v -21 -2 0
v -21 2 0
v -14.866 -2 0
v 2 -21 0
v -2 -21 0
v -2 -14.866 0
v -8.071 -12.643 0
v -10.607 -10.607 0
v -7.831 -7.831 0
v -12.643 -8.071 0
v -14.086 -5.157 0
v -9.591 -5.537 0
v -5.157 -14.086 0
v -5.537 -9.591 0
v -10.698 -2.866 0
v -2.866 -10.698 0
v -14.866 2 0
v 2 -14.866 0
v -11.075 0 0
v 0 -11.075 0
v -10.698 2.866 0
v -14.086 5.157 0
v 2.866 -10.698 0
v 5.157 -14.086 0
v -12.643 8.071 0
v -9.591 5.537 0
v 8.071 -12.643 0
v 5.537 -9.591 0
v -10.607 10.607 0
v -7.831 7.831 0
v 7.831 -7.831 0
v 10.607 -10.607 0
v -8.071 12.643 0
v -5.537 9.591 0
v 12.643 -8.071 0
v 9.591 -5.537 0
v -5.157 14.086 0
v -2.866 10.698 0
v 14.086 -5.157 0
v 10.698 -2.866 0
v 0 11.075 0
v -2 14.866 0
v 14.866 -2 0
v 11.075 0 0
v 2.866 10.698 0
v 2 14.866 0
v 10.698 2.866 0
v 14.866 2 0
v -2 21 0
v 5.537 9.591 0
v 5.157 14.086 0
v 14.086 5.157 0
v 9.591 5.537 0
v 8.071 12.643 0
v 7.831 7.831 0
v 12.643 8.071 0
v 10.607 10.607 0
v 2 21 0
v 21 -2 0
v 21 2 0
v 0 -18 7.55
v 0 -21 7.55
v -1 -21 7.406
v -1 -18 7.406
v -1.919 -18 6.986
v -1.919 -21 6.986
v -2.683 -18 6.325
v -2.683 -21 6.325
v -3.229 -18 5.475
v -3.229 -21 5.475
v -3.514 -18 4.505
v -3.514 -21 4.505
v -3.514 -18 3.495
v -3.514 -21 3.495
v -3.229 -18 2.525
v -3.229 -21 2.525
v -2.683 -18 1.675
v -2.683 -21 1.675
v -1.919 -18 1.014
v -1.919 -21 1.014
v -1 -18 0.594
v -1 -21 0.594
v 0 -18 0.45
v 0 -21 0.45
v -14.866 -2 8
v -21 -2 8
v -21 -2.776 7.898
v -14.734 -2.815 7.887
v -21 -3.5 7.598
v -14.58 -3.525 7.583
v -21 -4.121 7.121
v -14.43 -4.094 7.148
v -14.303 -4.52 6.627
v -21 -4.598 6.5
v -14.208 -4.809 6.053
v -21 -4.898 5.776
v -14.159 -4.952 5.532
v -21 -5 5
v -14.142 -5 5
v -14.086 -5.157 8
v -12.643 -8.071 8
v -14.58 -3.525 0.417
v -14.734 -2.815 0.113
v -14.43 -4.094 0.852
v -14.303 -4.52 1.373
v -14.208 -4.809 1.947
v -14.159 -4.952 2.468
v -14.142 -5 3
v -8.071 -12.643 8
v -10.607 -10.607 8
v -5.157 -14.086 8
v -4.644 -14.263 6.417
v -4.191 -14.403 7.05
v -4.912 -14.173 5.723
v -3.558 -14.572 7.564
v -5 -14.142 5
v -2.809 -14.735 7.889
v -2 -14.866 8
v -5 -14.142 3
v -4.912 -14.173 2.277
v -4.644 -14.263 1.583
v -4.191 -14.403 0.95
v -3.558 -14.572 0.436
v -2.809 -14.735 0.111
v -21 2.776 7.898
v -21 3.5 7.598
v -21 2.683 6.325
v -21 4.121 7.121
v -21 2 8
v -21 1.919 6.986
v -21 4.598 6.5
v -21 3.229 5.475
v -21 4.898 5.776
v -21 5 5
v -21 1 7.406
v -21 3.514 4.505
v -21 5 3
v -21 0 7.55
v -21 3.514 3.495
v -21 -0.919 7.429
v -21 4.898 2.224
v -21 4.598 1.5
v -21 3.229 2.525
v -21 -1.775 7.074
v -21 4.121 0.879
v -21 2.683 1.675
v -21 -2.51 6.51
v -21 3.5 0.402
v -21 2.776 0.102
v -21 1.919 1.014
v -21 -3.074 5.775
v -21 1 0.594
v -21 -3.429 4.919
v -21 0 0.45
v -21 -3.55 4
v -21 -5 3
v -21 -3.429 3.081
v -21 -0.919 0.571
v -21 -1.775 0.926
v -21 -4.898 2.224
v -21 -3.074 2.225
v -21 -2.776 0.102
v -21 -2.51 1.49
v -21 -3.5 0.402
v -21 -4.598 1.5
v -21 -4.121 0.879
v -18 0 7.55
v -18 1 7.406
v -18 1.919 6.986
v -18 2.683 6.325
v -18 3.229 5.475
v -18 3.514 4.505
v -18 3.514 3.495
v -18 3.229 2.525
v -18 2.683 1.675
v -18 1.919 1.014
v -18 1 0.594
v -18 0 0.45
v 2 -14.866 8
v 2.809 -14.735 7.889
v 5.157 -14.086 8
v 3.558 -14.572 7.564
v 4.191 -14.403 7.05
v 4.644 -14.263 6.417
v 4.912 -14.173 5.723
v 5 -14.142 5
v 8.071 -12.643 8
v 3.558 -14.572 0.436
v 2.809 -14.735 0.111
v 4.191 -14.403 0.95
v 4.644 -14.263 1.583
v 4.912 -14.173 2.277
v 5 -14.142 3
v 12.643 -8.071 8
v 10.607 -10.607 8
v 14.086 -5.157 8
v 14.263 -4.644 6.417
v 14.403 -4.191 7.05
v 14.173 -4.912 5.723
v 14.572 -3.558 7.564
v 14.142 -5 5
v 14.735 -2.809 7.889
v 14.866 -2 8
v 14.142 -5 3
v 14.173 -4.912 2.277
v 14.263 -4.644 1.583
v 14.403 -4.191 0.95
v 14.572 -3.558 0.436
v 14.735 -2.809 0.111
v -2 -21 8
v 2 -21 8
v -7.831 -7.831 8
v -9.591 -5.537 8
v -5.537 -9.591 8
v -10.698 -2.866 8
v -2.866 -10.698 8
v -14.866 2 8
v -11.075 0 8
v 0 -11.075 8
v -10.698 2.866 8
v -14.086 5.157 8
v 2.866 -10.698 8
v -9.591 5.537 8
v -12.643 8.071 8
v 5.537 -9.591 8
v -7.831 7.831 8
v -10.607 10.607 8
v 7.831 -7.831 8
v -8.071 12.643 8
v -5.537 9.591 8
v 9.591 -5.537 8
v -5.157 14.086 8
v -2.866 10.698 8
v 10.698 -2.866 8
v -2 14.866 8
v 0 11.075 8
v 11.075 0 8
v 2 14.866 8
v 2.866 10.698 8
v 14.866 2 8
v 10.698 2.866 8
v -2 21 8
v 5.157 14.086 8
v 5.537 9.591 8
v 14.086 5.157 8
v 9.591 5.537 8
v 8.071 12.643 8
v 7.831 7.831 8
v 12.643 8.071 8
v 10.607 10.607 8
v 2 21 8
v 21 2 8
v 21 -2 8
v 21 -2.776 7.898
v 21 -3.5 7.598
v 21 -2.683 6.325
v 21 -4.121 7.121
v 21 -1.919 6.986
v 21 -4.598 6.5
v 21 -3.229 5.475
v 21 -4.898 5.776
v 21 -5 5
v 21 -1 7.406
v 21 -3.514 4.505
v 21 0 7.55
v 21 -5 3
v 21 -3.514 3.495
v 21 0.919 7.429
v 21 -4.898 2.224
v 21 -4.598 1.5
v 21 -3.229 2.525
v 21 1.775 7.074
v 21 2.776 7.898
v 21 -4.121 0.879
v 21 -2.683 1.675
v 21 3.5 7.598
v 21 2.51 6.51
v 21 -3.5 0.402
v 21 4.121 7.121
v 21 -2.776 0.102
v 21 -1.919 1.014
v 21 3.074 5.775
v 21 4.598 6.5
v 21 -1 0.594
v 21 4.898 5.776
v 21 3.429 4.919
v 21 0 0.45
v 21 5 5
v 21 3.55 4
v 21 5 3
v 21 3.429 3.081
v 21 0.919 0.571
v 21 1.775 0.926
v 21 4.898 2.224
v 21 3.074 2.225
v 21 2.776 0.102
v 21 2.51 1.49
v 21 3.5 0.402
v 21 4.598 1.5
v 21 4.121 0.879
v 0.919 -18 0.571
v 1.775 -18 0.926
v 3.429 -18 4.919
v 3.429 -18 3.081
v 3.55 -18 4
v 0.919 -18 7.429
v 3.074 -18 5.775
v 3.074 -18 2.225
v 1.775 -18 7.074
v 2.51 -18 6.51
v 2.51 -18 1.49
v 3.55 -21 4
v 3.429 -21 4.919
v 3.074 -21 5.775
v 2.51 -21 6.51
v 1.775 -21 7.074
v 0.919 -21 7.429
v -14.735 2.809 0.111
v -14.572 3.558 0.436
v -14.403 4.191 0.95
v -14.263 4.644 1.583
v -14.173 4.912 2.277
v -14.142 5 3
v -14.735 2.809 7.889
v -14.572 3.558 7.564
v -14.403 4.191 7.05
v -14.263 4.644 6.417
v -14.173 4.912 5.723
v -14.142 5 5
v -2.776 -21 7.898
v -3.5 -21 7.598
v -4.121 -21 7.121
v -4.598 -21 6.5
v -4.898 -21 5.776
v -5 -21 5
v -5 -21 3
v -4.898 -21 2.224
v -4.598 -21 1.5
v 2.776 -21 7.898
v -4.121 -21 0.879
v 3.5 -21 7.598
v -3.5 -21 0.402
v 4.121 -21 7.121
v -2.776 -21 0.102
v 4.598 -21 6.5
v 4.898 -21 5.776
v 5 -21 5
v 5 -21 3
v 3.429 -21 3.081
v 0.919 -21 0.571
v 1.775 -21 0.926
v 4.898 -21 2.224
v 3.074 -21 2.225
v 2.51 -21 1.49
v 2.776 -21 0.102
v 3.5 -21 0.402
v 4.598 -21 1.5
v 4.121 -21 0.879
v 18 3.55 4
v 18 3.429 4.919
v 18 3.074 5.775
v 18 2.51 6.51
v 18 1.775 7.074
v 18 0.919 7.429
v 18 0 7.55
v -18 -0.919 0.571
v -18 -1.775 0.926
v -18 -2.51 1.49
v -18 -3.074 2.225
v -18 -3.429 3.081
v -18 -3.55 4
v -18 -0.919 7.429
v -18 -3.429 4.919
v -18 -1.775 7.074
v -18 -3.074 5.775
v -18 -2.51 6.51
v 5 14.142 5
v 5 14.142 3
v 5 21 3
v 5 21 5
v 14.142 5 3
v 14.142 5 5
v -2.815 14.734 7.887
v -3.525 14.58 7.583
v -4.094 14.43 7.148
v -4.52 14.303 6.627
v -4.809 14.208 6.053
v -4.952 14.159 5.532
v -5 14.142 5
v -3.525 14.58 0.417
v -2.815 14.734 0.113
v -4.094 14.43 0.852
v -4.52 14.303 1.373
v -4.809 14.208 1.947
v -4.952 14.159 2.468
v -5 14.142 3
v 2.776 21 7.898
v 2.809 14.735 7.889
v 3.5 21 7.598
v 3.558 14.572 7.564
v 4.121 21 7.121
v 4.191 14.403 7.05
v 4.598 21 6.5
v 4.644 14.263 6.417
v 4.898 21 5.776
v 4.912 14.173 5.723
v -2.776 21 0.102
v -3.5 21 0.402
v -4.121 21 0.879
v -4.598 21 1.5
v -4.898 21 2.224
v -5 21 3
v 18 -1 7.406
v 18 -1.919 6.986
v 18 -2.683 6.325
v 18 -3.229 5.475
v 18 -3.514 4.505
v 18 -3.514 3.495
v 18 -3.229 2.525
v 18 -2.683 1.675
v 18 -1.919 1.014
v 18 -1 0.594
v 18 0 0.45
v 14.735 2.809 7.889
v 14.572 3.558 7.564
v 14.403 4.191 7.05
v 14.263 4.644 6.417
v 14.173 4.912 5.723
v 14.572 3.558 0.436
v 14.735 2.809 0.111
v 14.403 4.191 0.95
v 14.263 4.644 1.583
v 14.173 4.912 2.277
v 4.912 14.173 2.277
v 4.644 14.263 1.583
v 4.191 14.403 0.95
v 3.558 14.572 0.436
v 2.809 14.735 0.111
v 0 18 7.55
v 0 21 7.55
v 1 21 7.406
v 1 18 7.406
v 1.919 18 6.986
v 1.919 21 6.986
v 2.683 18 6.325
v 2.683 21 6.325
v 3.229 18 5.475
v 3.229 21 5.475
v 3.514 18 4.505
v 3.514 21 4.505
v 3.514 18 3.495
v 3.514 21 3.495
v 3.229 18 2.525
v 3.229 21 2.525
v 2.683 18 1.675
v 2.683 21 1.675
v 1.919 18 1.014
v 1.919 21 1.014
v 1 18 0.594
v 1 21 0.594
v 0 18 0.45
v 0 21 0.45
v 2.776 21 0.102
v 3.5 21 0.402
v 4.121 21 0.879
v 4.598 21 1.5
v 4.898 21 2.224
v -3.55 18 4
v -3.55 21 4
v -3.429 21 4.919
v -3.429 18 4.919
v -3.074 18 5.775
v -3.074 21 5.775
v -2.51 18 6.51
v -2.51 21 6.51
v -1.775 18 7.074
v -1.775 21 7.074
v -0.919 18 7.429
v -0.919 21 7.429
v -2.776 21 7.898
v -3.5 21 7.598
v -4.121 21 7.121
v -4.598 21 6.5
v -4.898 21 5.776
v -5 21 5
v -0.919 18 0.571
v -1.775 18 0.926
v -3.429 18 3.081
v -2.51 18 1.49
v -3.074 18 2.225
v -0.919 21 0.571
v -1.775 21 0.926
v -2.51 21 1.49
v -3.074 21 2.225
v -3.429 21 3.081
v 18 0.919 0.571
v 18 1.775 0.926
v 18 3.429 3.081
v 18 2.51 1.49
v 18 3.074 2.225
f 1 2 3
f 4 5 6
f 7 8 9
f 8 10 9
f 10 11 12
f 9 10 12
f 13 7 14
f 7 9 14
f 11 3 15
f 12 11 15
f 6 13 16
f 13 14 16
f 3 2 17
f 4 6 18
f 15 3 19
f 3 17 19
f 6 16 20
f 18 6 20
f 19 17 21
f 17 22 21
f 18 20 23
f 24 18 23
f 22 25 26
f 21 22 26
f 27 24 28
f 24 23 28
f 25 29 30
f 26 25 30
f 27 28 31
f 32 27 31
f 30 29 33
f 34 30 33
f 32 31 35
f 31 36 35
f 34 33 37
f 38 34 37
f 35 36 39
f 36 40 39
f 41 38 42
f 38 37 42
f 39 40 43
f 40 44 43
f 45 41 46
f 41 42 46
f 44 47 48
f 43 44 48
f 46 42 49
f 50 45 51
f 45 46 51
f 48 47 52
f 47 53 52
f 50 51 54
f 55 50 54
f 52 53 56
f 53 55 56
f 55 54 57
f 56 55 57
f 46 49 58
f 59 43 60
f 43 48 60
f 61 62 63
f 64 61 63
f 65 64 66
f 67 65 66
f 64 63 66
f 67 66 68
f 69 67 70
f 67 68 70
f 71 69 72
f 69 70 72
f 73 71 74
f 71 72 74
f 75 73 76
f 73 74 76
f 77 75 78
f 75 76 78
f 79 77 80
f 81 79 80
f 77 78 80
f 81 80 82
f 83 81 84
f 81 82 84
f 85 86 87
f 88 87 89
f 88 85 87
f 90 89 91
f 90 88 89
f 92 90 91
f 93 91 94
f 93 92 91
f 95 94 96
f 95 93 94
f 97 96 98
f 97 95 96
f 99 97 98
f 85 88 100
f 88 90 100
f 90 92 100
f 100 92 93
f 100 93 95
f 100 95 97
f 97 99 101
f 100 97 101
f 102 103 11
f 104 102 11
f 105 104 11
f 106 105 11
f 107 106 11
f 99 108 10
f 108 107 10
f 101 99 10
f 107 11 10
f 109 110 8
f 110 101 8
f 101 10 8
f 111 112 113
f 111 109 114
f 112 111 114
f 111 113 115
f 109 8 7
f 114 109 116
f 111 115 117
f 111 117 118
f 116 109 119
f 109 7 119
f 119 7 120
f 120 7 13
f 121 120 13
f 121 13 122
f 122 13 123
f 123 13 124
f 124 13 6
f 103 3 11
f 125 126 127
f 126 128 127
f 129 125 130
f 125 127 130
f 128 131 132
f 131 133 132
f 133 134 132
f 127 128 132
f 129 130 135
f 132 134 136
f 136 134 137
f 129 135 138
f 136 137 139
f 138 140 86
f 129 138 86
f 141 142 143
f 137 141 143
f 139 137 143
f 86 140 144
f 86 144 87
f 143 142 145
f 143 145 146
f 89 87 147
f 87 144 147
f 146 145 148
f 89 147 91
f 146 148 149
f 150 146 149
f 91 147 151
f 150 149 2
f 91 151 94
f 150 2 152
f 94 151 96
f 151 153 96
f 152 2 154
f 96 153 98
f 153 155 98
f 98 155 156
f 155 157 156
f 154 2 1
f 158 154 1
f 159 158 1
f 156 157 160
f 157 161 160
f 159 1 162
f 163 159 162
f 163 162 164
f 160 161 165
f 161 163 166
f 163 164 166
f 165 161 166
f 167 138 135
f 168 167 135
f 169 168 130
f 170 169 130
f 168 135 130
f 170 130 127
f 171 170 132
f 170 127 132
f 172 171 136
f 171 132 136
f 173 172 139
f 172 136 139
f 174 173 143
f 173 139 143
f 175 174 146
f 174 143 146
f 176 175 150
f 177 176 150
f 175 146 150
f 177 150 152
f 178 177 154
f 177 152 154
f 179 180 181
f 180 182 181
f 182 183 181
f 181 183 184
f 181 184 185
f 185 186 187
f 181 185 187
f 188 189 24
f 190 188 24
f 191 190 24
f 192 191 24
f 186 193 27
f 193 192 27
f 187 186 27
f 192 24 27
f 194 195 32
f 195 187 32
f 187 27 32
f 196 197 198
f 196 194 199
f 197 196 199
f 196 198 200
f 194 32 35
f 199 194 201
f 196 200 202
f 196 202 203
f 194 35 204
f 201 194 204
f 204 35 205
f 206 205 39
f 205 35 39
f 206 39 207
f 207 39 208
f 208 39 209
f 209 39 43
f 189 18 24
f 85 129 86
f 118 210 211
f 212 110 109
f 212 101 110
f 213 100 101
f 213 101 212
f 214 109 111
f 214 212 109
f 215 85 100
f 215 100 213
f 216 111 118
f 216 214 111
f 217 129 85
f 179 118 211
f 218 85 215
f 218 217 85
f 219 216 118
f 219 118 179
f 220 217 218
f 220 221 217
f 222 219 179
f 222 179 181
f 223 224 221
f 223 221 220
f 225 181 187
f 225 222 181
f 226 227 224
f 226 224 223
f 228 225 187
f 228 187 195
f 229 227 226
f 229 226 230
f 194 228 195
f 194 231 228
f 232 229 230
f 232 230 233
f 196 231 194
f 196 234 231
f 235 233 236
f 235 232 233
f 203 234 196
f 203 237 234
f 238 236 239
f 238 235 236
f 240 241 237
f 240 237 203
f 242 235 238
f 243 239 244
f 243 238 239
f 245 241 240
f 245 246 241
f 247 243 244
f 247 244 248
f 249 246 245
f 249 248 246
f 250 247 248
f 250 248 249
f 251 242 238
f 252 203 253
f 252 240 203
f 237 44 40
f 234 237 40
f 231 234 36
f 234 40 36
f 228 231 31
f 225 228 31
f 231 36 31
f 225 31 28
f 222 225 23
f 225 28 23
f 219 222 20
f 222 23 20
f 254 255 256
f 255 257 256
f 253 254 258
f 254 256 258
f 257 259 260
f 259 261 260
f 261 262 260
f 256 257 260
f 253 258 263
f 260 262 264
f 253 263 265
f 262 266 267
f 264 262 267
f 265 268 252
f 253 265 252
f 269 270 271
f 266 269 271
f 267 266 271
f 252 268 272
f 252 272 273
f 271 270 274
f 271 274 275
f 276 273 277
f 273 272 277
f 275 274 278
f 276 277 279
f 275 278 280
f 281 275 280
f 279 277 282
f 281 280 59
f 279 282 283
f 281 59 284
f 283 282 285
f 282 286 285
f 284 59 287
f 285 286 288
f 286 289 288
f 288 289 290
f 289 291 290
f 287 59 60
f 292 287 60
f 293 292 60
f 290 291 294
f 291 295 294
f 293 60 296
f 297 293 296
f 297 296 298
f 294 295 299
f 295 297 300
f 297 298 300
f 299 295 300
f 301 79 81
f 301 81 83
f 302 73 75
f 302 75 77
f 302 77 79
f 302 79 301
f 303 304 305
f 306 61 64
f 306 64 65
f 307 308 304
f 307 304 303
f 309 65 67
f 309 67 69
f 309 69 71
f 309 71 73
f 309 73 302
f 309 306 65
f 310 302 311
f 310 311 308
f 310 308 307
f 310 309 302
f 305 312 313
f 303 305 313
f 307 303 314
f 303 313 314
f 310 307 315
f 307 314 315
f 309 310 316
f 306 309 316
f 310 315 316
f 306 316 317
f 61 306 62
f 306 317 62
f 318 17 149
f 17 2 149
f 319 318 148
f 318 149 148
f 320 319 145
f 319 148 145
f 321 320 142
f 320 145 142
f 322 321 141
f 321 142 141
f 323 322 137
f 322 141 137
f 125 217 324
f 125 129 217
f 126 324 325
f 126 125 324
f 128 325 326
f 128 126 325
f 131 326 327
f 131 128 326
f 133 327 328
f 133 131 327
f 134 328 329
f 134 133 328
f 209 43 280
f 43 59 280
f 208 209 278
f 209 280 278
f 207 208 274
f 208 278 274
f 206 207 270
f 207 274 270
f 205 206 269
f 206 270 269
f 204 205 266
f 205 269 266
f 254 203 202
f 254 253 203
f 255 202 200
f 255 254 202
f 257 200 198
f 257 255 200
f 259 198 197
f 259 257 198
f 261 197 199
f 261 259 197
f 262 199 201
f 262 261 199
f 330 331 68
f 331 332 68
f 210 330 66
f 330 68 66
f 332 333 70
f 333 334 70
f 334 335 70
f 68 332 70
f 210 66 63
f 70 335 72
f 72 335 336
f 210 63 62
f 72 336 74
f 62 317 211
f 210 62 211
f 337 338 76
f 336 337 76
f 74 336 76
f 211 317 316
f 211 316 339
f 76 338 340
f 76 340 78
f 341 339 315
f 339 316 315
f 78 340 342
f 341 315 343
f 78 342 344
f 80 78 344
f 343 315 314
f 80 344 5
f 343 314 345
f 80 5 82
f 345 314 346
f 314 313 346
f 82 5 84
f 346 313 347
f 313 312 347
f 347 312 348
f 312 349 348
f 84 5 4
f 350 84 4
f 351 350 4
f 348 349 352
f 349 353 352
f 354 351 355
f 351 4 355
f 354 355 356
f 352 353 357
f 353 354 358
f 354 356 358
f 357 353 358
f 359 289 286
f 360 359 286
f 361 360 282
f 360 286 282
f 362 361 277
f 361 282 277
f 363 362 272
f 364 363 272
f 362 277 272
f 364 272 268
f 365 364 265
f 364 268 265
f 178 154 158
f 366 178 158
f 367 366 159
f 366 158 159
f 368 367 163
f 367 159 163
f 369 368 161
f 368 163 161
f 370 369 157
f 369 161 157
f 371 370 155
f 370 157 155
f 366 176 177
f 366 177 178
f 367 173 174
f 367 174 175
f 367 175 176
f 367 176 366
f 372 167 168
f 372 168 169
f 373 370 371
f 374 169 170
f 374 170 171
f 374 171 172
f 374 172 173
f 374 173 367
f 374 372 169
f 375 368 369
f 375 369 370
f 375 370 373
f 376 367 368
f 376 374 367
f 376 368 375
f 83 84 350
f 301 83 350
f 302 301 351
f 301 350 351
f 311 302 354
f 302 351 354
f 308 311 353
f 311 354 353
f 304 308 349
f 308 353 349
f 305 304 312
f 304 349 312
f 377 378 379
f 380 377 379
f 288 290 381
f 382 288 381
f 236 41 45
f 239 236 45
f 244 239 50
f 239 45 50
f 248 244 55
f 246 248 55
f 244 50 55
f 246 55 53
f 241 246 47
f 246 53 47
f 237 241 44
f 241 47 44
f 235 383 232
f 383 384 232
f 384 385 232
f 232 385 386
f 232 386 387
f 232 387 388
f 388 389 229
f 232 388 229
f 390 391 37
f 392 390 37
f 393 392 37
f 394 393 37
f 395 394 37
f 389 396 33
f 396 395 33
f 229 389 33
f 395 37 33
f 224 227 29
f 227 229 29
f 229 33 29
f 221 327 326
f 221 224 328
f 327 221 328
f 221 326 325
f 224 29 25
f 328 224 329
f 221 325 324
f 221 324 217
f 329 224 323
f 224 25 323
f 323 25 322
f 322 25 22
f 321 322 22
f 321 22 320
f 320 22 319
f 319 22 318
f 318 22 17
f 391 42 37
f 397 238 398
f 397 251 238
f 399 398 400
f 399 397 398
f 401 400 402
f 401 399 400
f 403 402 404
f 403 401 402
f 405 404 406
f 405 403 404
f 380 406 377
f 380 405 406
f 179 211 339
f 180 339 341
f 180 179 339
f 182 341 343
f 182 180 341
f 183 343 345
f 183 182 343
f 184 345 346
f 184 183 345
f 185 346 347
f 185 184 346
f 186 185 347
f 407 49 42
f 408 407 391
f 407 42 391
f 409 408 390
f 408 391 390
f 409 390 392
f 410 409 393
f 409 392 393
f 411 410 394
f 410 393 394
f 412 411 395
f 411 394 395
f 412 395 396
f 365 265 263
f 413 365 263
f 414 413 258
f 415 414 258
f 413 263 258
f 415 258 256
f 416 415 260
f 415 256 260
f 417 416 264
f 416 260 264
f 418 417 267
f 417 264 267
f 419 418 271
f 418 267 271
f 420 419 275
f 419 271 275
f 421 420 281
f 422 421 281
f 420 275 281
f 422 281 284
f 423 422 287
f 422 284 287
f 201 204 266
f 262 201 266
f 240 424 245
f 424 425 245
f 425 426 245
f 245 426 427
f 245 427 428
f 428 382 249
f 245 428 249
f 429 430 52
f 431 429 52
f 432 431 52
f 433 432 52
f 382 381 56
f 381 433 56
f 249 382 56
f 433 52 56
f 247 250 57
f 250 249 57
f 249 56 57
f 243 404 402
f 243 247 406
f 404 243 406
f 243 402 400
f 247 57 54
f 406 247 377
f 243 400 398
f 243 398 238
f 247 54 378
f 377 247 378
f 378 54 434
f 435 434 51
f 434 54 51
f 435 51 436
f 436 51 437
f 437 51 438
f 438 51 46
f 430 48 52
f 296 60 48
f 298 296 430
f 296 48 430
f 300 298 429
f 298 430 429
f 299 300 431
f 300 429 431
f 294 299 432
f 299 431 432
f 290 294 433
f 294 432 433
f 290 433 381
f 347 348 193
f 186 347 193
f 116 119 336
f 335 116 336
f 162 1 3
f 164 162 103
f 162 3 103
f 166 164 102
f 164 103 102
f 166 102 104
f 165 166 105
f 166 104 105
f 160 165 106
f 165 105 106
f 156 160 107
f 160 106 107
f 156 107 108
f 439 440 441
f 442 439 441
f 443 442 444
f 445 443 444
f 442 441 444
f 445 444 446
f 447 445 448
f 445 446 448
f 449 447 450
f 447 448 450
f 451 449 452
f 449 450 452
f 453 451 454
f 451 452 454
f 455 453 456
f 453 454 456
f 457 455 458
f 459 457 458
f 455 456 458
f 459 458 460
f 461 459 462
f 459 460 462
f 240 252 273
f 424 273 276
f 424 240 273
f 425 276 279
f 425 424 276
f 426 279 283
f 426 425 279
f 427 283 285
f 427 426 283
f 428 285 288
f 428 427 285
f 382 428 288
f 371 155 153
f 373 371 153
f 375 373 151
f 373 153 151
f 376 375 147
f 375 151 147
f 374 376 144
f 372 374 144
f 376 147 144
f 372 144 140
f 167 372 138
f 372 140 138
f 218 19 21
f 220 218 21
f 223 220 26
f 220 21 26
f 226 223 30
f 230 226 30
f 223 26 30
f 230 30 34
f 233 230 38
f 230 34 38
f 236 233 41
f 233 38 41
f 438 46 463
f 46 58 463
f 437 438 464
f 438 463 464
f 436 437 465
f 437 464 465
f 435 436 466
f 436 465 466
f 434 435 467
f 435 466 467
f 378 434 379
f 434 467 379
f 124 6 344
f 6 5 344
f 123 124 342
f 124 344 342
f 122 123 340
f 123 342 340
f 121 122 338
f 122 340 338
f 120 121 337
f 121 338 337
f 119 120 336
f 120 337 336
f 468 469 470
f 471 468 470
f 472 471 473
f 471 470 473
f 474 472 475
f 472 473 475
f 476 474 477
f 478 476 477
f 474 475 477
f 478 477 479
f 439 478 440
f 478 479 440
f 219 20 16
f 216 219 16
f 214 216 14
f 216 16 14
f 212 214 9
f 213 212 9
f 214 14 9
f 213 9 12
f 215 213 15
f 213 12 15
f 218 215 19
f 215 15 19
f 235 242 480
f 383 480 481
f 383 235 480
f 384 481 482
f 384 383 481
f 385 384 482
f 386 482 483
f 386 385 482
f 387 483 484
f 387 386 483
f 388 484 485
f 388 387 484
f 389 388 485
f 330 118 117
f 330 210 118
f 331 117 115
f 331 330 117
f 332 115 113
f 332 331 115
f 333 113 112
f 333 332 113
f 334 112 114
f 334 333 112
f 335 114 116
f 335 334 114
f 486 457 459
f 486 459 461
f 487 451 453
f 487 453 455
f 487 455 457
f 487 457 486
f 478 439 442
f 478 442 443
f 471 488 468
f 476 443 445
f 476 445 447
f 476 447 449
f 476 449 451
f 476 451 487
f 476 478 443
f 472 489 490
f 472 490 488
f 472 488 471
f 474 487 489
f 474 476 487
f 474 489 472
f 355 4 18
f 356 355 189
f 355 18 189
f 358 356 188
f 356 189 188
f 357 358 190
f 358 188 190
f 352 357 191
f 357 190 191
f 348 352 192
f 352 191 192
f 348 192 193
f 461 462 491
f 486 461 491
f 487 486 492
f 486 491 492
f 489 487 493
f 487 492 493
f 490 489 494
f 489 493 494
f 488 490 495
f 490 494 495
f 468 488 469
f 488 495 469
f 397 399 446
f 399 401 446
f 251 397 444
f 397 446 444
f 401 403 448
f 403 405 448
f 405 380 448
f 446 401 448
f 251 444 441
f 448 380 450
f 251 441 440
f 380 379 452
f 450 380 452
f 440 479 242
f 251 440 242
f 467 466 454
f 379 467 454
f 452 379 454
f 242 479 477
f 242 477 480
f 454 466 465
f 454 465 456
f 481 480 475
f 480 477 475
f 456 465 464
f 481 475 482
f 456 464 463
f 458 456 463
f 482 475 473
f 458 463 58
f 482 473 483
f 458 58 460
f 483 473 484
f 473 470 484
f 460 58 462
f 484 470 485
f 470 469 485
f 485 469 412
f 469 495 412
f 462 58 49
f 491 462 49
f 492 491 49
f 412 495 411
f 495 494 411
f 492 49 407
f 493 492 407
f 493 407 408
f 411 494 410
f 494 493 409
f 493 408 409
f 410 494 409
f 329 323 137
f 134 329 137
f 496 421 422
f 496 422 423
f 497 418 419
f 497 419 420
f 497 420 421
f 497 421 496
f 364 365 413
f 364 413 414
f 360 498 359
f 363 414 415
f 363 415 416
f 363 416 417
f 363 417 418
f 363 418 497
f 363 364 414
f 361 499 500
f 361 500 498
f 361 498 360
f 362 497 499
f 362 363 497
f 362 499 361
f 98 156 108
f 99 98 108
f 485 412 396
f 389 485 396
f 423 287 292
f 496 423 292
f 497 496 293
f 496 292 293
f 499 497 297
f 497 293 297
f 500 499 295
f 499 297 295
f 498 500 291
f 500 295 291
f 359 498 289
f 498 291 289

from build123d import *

# Parameters (mm, degrees)
F1_DEPTH = 8
F6_DEPTH = 3
F7_DEPTH = 3
F8_DEPTH = 3
F9_DEPTH = 3
F10_R    = 3


with BuildPart() as f1:
    # F0 (on Top) → F1 (new body)
    with BuildSketch(Plane.XY):
        with BuildLine():
            ThreePointArc((-11.075, 0), (-7.8312076016, 7.8312076016), (0, 11.075))
            Line((0, 11.075), (0, 15))
            ThreePointArc((0, 15), (-2.5365296809, 14.7839783948), (-5, 14.1421356237))
            ThreePointArc((-5, 14.1421356237), (-10.6066017178, 10.6066017178), (-14.1421356237, 5))
            ThreePointArc((-14.1421356237, 5), (-14.7839783948, 2.5365296809), (-15, 0))
            Line((-15, 0), (-11.075, 0))
        make_face()
        with BuildLine():
            Line((0, -15), (0, -11.075))
            ThreePointArc((0, -11.075), (-7.8312076016, -7.8312076016), (-11.075, 0))
            Line((-11.075, 0), (-15, 0))
            ThreePointArc((-15, 0), (-14.7839783948, -2.5365296809), (-14.1421356237, -5))
            ThreePointArc((-14.1421356237, -5), (-10.6066017178, -10.6066017178), (-5, -14.1421356237))
            ThreePointArc((-5, -14.1421356237), (-2.5365296809, -14.7839783948), (0, -15))
        make_face()
        with BuildLine():
            ThreePointArc((-14.1421356237, -5), (-14.7839783948, -2.5365296809), (-15, 0))
            Line((-15, 0), (-21, 0))
            Line((-21, 0), (-21, -5))
            Line((-21, -5), (-14.1421356237, -5))
        make_face()
        with BuildLine():
            Line((-21, 0), (-15, 0))
            ThreePointArc((-15, 0), (-14.7839783948, 2.5365296809), (-14.1421356237, 5))
            Line((-14.1421356237, 5), (-21, 5))
            Line((-21, 5), (-21, 0))
        make_face()
        with BuildLine():
            ThreePointArc((-5, 14.1421356237), (-2.5365296809, 14.7839783948), (0, 15))
            Line((0, 15), (0, 21))
            Line((0, 21), (-5, 21))
            Line((-5, 21), (-5, 14.1421356237))
        make_face()
        with BuildLine():
            ThreePointArc((0, 11.075), (7.8312076016, 7.8312076016), (11.075, 0))
            Line((11.075, 0), (15, 0))
            ThreePointArc((15, 0), (14.7839783948, 2.5365296809), (14.1421356237, 5))
            ThreePointArc((14.1421356237, 5), (10.6066017178, 10.6066017178), (5, 14.1421356237))
            ThreePointArc((5, 14.1421356237), (2.5365296809, 14.7839783948), (0, 15))
            Line((0, 15), (0, 11.075))
        make_face()
        with BuildLine():
            Line((15, 0), (11.075, 0))
            ThreePointArc((11.075, 0), (7.8312076016, -7.8312076016), (0, -11.075))
            Line((0, -11.075), (0, -15))
            ThreePointArc((0, -15), (2.5365296809, -14.7839783948), (5, -14.1421356237))
            ThreePointArc((5, -14.1421356237), (10.6066017178, -10.6066017178), (14.1421356237, -5))
            ThreePointArc((14.1421356237, -5), (14.7839783948, -2.5365296809), (15, 0))
        make_face()
        with BuildLine():
            ThreePointArc((5, -14.1421356237), (2.5365296809, -14.7839783948), (0, -15))
            Line((0, -15), (0, -21))
            Line((0, -21), (5, -21))
            Line((5, -21), (5, -14.1421356237))
        make_face()
        with BuildLine():
            Line((0, -21), (0, -15))
            ThreePointArc((0, -15), (-2.5365296809, -14.7839783948), (-5, -14.1421356237))
            Line((-5, -14.1421356237), (-5, -21))
            Line((-5, -21), (0, -21))
        make_face()
        with BuildLine():
            Line((21, 0), (15, 0))
            ThreePointArc((15, 0), (14.7839783948, -2.5365296809), (14.1421356237, -5))
            Line((14.1421356237, -5), (21, -5))
            Line((21, -5), (21, 0))
        make_face()
        with BuildLine():
            ThreePointArc((14.1421356237, 5), (14.7839783948, 2.5365296809), (15, 0))
            Line((15, 0), (21, 0))
            Line((21, 0), (21, 5))
            Line((21, 5), (14.1421356237, 5))
        make_face()
        with BuildLine():
            Line((0, 21), (0, 15))
            ThreePointArc((0, 15), (2.5365296809, 14.7839783948), (5, 14.1421356237))
            Line((5, 14.1421356237), (5, 21))
            Line((5, 21), (0, 21))
        make_face()
    extrude(amount=F1_DEPTH)

    # F5 (on face) → F6 (cut)
    with BuildSketch(Plane.XZ.offset(21)):
        with BuildLine():
            Line((0, 7.55), (0, 0.45))
            ThreePointArc((0, 0.45), (2.5102290732, 1.4897709268), (3.55, 4))
            ThreePointArc((3.55, 4), (2.5102290732, 6.5102290732), (0, 7.55))
        make_face()
        with BuildLine():
            ThreePointArc((0, 7.55), (-3.55, 4), (0, 0.45))
            Line((0, 0.45), (0, 7.55))
        make_face()
    extrude(amount=-F6_DEPTH, mode=Mode.SUBTRACT)

    # F2 (on face) → F7 (cut)
    with BuildSketch(Plane(origin=(-21, 0, 0), x_dir=(0, -1, 0), z_dir=(-1, 0, 0))):
        with BuildLine():
            ThreePointArc((0, 7.55), (-3.55, 4), (0, 0.45))
            Line((0, 0.45), (0, 7.55))
        make_face()
        with BuildLine():
            Line((0, 7.55), (0, 0.45))
            ThreePointArc((0, 0.45), (2.5102290732, 1.4897709268), (3.55, 4))
            ThreePointArc((3.55, 4), (2.5102290732, 6.5102290732), (0, 7.55))
        make_face()
    extrude(amount=-F7_DEPTH, mode=Mode.SUBTRACT)

    # F3 (on face) → F8 (cut)
    with BuildSketch(Plane(origin=(0, 21, 0), x_dir=(-1, 0, 0), z_dir=(0, 1, 0))):
        with BuildLine():
            ThreePointArc((0, 7.55), (-3.55, 4), (0, 0.45))
            Line((0, 0.45), (0, 7.55))
        make_face()
        with BuildLine():
            Line((0, 7.55), (0, 0.45))
            ThreePointArc((0, 0.45), (2.5102290732, 1.4897709268), (3.55, 4))
            ThreePointArc((3.55, 4), (2.5102290732, 6.5102290732), (0, 7.55))
        make_face()
    extrude(amount=-F8_DEPTH, mode=Mode.SUBTRACT)

    # F4 (on face) → F9 (cut)
    with BuildSketch(Plane.YZ.offset(21)):
        with BuildLine():
            ThreePointArc((0, 7.55), (-3.55, 4), (0, 0.45))
            Line((0, 0.45), (0, 7.55))
        make_face()
        with BuildLine():
            Line((0, 7.55), (0, 0.45))
            ThreePointArc((0, 0.45), (2.5102290732, 1.4897709268), (3.55, 4))
            ThreePointArc((3.55, 4), (2.5102290732, 6.5102290732), (0, 7.55))
        make_face()
    extrude(amount=-F9_DEPTH, mode=Mode.SUBTRACT)

    # F10
    f10_edges = [f1.edges().sort_by_distance(p)[0] for p in [
        (-5, -17.571068, 0),
        (-5, -17.571068, 8),
        (5, -17.571068, 8),
        (5, -17.571068, 0),
        (-17.571068, 5, 8),
        (-17.571068, 5, 0),
        (-17.571068, -5, 8),
        (-17.571068, -5, 0),
        (5, 17.571068, 8),
        (5, 17.571068, 0),
        (17.571068, 5, 8),
        (17.571068, 5, 0),
        (17.571068, -5, 8),
        (17.571068, -5, 0),
        (-5, 17.571068, 8),
        (-5, 17.571068, 0),
    ]]
    fillet(f10_edges, radius=F10_R)


solid = f1.part
